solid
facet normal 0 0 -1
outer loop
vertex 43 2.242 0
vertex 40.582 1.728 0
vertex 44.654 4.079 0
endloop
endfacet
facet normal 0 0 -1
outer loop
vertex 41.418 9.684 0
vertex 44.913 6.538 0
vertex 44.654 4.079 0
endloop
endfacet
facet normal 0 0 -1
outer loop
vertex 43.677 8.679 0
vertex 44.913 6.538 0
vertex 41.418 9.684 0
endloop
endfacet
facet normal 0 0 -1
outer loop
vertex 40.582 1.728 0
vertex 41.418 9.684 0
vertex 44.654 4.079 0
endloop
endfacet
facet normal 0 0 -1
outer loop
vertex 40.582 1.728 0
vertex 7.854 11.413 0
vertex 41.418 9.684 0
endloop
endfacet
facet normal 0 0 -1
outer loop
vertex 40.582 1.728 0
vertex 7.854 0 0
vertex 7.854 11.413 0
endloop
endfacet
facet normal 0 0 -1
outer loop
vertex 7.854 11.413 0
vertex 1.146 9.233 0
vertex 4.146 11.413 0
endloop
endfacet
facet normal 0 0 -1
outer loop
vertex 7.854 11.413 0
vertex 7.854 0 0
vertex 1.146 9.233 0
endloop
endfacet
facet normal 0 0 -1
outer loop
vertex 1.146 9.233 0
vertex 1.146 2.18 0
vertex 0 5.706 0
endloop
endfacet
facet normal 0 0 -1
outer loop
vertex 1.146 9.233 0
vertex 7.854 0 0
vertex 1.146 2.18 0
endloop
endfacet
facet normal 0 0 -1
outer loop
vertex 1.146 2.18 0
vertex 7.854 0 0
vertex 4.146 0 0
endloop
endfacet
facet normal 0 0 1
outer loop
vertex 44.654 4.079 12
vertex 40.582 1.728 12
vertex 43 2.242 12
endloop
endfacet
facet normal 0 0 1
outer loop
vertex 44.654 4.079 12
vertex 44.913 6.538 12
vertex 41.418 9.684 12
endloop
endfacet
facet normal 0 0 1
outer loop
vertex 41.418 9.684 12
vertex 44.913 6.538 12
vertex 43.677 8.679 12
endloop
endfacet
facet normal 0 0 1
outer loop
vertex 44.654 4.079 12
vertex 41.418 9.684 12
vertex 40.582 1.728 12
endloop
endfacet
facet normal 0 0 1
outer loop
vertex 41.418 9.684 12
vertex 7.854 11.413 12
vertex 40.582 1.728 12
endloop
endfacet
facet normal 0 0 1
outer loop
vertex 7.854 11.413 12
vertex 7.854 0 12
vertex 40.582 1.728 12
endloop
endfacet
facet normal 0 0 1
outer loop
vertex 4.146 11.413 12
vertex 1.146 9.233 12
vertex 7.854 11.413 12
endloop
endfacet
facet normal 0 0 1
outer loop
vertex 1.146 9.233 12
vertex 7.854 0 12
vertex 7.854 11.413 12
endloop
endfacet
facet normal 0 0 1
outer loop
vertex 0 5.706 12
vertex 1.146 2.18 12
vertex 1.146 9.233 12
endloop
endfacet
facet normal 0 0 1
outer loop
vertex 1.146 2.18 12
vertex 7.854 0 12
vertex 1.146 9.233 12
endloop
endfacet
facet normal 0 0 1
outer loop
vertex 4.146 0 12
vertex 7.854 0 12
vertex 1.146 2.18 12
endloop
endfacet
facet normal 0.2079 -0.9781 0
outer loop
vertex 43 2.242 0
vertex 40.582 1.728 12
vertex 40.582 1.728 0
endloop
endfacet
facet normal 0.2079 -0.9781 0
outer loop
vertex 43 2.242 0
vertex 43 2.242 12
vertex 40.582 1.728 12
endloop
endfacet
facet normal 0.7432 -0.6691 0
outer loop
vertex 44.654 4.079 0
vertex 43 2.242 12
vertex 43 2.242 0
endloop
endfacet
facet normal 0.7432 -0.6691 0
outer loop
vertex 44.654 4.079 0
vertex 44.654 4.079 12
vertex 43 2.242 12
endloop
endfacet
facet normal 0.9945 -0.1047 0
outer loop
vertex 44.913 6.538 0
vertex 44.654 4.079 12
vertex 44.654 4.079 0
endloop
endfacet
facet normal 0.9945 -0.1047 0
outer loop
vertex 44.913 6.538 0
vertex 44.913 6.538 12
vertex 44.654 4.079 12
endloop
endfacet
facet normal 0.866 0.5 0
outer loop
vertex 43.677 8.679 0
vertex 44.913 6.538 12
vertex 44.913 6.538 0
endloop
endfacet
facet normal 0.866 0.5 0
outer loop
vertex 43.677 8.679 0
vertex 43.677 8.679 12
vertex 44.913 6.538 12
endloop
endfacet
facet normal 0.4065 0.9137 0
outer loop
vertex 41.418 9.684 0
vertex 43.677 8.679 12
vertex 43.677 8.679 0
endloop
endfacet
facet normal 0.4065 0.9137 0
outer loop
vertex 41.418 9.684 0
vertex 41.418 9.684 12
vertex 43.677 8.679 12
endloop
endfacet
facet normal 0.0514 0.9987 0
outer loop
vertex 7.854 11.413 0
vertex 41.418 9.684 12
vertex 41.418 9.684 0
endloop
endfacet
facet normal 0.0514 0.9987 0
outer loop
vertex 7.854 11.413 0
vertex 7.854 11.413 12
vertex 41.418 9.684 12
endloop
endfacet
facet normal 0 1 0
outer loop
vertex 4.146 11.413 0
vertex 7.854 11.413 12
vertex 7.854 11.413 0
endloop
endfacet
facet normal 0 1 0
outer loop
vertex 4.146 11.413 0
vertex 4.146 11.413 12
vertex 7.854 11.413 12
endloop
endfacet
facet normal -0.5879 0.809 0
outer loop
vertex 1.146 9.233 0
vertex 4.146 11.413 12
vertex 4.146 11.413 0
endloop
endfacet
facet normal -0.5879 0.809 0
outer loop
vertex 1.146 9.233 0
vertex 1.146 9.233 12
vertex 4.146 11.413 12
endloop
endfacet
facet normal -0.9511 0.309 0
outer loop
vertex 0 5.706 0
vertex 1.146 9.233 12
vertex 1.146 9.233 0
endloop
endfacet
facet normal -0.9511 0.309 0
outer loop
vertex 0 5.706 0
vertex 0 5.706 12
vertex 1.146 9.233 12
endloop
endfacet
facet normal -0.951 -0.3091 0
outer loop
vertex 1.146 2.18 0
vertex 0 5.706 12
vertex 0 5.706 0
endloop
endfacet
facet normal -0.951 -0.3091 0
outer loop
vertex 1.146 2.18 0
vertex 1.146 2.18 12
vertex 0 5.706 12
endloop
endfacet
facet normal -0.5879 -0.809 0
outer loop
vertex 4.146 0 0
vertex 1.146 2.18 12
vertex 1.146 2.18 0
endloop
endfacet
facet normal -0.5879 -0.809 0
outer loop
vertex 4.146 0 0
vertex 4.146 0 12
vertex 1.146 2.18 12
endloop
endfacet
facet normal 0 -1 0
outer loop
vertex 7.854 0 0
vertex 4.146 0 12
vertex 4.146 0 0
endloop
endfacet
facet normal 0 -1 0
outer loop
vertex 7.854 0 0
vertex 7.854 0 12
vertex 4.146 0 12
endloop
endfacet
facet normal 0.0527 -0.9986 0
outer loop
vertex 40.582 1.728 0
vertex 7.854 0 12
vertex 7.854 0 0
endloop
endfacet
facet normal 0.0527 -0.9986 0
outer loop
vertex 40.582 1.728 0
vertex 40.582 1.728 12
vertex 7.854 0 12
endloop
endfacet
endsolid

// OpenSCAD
$fn = 32;

// ----------------------------------------------------------------------
// Lever arm: two bosses 12 and 8 mm, 35 mm between centres
// ----------------------------------------------------------------------

// --- parameters (mm) ---
profile_height = 12;      // extrusion height
profile_points = 13;      // points of the closed outline

profile = [[0, 5.706], [1.146, 2.18], [4.146, 0], [7.854, 0], [40.582, 1.728], [43, 2.242], [44.654, 4.079], [44.913, 6.538], [43.677, 8.679], [41.418, 9.684], [7.854, 11.413], [4.146, 11.413], [1.146, 9.233]];  // single closed polygon, 13 points, counter clockwise

// --- the one profile operation ---
linear_extrude(height = profile_height) polygon(points = profile);
